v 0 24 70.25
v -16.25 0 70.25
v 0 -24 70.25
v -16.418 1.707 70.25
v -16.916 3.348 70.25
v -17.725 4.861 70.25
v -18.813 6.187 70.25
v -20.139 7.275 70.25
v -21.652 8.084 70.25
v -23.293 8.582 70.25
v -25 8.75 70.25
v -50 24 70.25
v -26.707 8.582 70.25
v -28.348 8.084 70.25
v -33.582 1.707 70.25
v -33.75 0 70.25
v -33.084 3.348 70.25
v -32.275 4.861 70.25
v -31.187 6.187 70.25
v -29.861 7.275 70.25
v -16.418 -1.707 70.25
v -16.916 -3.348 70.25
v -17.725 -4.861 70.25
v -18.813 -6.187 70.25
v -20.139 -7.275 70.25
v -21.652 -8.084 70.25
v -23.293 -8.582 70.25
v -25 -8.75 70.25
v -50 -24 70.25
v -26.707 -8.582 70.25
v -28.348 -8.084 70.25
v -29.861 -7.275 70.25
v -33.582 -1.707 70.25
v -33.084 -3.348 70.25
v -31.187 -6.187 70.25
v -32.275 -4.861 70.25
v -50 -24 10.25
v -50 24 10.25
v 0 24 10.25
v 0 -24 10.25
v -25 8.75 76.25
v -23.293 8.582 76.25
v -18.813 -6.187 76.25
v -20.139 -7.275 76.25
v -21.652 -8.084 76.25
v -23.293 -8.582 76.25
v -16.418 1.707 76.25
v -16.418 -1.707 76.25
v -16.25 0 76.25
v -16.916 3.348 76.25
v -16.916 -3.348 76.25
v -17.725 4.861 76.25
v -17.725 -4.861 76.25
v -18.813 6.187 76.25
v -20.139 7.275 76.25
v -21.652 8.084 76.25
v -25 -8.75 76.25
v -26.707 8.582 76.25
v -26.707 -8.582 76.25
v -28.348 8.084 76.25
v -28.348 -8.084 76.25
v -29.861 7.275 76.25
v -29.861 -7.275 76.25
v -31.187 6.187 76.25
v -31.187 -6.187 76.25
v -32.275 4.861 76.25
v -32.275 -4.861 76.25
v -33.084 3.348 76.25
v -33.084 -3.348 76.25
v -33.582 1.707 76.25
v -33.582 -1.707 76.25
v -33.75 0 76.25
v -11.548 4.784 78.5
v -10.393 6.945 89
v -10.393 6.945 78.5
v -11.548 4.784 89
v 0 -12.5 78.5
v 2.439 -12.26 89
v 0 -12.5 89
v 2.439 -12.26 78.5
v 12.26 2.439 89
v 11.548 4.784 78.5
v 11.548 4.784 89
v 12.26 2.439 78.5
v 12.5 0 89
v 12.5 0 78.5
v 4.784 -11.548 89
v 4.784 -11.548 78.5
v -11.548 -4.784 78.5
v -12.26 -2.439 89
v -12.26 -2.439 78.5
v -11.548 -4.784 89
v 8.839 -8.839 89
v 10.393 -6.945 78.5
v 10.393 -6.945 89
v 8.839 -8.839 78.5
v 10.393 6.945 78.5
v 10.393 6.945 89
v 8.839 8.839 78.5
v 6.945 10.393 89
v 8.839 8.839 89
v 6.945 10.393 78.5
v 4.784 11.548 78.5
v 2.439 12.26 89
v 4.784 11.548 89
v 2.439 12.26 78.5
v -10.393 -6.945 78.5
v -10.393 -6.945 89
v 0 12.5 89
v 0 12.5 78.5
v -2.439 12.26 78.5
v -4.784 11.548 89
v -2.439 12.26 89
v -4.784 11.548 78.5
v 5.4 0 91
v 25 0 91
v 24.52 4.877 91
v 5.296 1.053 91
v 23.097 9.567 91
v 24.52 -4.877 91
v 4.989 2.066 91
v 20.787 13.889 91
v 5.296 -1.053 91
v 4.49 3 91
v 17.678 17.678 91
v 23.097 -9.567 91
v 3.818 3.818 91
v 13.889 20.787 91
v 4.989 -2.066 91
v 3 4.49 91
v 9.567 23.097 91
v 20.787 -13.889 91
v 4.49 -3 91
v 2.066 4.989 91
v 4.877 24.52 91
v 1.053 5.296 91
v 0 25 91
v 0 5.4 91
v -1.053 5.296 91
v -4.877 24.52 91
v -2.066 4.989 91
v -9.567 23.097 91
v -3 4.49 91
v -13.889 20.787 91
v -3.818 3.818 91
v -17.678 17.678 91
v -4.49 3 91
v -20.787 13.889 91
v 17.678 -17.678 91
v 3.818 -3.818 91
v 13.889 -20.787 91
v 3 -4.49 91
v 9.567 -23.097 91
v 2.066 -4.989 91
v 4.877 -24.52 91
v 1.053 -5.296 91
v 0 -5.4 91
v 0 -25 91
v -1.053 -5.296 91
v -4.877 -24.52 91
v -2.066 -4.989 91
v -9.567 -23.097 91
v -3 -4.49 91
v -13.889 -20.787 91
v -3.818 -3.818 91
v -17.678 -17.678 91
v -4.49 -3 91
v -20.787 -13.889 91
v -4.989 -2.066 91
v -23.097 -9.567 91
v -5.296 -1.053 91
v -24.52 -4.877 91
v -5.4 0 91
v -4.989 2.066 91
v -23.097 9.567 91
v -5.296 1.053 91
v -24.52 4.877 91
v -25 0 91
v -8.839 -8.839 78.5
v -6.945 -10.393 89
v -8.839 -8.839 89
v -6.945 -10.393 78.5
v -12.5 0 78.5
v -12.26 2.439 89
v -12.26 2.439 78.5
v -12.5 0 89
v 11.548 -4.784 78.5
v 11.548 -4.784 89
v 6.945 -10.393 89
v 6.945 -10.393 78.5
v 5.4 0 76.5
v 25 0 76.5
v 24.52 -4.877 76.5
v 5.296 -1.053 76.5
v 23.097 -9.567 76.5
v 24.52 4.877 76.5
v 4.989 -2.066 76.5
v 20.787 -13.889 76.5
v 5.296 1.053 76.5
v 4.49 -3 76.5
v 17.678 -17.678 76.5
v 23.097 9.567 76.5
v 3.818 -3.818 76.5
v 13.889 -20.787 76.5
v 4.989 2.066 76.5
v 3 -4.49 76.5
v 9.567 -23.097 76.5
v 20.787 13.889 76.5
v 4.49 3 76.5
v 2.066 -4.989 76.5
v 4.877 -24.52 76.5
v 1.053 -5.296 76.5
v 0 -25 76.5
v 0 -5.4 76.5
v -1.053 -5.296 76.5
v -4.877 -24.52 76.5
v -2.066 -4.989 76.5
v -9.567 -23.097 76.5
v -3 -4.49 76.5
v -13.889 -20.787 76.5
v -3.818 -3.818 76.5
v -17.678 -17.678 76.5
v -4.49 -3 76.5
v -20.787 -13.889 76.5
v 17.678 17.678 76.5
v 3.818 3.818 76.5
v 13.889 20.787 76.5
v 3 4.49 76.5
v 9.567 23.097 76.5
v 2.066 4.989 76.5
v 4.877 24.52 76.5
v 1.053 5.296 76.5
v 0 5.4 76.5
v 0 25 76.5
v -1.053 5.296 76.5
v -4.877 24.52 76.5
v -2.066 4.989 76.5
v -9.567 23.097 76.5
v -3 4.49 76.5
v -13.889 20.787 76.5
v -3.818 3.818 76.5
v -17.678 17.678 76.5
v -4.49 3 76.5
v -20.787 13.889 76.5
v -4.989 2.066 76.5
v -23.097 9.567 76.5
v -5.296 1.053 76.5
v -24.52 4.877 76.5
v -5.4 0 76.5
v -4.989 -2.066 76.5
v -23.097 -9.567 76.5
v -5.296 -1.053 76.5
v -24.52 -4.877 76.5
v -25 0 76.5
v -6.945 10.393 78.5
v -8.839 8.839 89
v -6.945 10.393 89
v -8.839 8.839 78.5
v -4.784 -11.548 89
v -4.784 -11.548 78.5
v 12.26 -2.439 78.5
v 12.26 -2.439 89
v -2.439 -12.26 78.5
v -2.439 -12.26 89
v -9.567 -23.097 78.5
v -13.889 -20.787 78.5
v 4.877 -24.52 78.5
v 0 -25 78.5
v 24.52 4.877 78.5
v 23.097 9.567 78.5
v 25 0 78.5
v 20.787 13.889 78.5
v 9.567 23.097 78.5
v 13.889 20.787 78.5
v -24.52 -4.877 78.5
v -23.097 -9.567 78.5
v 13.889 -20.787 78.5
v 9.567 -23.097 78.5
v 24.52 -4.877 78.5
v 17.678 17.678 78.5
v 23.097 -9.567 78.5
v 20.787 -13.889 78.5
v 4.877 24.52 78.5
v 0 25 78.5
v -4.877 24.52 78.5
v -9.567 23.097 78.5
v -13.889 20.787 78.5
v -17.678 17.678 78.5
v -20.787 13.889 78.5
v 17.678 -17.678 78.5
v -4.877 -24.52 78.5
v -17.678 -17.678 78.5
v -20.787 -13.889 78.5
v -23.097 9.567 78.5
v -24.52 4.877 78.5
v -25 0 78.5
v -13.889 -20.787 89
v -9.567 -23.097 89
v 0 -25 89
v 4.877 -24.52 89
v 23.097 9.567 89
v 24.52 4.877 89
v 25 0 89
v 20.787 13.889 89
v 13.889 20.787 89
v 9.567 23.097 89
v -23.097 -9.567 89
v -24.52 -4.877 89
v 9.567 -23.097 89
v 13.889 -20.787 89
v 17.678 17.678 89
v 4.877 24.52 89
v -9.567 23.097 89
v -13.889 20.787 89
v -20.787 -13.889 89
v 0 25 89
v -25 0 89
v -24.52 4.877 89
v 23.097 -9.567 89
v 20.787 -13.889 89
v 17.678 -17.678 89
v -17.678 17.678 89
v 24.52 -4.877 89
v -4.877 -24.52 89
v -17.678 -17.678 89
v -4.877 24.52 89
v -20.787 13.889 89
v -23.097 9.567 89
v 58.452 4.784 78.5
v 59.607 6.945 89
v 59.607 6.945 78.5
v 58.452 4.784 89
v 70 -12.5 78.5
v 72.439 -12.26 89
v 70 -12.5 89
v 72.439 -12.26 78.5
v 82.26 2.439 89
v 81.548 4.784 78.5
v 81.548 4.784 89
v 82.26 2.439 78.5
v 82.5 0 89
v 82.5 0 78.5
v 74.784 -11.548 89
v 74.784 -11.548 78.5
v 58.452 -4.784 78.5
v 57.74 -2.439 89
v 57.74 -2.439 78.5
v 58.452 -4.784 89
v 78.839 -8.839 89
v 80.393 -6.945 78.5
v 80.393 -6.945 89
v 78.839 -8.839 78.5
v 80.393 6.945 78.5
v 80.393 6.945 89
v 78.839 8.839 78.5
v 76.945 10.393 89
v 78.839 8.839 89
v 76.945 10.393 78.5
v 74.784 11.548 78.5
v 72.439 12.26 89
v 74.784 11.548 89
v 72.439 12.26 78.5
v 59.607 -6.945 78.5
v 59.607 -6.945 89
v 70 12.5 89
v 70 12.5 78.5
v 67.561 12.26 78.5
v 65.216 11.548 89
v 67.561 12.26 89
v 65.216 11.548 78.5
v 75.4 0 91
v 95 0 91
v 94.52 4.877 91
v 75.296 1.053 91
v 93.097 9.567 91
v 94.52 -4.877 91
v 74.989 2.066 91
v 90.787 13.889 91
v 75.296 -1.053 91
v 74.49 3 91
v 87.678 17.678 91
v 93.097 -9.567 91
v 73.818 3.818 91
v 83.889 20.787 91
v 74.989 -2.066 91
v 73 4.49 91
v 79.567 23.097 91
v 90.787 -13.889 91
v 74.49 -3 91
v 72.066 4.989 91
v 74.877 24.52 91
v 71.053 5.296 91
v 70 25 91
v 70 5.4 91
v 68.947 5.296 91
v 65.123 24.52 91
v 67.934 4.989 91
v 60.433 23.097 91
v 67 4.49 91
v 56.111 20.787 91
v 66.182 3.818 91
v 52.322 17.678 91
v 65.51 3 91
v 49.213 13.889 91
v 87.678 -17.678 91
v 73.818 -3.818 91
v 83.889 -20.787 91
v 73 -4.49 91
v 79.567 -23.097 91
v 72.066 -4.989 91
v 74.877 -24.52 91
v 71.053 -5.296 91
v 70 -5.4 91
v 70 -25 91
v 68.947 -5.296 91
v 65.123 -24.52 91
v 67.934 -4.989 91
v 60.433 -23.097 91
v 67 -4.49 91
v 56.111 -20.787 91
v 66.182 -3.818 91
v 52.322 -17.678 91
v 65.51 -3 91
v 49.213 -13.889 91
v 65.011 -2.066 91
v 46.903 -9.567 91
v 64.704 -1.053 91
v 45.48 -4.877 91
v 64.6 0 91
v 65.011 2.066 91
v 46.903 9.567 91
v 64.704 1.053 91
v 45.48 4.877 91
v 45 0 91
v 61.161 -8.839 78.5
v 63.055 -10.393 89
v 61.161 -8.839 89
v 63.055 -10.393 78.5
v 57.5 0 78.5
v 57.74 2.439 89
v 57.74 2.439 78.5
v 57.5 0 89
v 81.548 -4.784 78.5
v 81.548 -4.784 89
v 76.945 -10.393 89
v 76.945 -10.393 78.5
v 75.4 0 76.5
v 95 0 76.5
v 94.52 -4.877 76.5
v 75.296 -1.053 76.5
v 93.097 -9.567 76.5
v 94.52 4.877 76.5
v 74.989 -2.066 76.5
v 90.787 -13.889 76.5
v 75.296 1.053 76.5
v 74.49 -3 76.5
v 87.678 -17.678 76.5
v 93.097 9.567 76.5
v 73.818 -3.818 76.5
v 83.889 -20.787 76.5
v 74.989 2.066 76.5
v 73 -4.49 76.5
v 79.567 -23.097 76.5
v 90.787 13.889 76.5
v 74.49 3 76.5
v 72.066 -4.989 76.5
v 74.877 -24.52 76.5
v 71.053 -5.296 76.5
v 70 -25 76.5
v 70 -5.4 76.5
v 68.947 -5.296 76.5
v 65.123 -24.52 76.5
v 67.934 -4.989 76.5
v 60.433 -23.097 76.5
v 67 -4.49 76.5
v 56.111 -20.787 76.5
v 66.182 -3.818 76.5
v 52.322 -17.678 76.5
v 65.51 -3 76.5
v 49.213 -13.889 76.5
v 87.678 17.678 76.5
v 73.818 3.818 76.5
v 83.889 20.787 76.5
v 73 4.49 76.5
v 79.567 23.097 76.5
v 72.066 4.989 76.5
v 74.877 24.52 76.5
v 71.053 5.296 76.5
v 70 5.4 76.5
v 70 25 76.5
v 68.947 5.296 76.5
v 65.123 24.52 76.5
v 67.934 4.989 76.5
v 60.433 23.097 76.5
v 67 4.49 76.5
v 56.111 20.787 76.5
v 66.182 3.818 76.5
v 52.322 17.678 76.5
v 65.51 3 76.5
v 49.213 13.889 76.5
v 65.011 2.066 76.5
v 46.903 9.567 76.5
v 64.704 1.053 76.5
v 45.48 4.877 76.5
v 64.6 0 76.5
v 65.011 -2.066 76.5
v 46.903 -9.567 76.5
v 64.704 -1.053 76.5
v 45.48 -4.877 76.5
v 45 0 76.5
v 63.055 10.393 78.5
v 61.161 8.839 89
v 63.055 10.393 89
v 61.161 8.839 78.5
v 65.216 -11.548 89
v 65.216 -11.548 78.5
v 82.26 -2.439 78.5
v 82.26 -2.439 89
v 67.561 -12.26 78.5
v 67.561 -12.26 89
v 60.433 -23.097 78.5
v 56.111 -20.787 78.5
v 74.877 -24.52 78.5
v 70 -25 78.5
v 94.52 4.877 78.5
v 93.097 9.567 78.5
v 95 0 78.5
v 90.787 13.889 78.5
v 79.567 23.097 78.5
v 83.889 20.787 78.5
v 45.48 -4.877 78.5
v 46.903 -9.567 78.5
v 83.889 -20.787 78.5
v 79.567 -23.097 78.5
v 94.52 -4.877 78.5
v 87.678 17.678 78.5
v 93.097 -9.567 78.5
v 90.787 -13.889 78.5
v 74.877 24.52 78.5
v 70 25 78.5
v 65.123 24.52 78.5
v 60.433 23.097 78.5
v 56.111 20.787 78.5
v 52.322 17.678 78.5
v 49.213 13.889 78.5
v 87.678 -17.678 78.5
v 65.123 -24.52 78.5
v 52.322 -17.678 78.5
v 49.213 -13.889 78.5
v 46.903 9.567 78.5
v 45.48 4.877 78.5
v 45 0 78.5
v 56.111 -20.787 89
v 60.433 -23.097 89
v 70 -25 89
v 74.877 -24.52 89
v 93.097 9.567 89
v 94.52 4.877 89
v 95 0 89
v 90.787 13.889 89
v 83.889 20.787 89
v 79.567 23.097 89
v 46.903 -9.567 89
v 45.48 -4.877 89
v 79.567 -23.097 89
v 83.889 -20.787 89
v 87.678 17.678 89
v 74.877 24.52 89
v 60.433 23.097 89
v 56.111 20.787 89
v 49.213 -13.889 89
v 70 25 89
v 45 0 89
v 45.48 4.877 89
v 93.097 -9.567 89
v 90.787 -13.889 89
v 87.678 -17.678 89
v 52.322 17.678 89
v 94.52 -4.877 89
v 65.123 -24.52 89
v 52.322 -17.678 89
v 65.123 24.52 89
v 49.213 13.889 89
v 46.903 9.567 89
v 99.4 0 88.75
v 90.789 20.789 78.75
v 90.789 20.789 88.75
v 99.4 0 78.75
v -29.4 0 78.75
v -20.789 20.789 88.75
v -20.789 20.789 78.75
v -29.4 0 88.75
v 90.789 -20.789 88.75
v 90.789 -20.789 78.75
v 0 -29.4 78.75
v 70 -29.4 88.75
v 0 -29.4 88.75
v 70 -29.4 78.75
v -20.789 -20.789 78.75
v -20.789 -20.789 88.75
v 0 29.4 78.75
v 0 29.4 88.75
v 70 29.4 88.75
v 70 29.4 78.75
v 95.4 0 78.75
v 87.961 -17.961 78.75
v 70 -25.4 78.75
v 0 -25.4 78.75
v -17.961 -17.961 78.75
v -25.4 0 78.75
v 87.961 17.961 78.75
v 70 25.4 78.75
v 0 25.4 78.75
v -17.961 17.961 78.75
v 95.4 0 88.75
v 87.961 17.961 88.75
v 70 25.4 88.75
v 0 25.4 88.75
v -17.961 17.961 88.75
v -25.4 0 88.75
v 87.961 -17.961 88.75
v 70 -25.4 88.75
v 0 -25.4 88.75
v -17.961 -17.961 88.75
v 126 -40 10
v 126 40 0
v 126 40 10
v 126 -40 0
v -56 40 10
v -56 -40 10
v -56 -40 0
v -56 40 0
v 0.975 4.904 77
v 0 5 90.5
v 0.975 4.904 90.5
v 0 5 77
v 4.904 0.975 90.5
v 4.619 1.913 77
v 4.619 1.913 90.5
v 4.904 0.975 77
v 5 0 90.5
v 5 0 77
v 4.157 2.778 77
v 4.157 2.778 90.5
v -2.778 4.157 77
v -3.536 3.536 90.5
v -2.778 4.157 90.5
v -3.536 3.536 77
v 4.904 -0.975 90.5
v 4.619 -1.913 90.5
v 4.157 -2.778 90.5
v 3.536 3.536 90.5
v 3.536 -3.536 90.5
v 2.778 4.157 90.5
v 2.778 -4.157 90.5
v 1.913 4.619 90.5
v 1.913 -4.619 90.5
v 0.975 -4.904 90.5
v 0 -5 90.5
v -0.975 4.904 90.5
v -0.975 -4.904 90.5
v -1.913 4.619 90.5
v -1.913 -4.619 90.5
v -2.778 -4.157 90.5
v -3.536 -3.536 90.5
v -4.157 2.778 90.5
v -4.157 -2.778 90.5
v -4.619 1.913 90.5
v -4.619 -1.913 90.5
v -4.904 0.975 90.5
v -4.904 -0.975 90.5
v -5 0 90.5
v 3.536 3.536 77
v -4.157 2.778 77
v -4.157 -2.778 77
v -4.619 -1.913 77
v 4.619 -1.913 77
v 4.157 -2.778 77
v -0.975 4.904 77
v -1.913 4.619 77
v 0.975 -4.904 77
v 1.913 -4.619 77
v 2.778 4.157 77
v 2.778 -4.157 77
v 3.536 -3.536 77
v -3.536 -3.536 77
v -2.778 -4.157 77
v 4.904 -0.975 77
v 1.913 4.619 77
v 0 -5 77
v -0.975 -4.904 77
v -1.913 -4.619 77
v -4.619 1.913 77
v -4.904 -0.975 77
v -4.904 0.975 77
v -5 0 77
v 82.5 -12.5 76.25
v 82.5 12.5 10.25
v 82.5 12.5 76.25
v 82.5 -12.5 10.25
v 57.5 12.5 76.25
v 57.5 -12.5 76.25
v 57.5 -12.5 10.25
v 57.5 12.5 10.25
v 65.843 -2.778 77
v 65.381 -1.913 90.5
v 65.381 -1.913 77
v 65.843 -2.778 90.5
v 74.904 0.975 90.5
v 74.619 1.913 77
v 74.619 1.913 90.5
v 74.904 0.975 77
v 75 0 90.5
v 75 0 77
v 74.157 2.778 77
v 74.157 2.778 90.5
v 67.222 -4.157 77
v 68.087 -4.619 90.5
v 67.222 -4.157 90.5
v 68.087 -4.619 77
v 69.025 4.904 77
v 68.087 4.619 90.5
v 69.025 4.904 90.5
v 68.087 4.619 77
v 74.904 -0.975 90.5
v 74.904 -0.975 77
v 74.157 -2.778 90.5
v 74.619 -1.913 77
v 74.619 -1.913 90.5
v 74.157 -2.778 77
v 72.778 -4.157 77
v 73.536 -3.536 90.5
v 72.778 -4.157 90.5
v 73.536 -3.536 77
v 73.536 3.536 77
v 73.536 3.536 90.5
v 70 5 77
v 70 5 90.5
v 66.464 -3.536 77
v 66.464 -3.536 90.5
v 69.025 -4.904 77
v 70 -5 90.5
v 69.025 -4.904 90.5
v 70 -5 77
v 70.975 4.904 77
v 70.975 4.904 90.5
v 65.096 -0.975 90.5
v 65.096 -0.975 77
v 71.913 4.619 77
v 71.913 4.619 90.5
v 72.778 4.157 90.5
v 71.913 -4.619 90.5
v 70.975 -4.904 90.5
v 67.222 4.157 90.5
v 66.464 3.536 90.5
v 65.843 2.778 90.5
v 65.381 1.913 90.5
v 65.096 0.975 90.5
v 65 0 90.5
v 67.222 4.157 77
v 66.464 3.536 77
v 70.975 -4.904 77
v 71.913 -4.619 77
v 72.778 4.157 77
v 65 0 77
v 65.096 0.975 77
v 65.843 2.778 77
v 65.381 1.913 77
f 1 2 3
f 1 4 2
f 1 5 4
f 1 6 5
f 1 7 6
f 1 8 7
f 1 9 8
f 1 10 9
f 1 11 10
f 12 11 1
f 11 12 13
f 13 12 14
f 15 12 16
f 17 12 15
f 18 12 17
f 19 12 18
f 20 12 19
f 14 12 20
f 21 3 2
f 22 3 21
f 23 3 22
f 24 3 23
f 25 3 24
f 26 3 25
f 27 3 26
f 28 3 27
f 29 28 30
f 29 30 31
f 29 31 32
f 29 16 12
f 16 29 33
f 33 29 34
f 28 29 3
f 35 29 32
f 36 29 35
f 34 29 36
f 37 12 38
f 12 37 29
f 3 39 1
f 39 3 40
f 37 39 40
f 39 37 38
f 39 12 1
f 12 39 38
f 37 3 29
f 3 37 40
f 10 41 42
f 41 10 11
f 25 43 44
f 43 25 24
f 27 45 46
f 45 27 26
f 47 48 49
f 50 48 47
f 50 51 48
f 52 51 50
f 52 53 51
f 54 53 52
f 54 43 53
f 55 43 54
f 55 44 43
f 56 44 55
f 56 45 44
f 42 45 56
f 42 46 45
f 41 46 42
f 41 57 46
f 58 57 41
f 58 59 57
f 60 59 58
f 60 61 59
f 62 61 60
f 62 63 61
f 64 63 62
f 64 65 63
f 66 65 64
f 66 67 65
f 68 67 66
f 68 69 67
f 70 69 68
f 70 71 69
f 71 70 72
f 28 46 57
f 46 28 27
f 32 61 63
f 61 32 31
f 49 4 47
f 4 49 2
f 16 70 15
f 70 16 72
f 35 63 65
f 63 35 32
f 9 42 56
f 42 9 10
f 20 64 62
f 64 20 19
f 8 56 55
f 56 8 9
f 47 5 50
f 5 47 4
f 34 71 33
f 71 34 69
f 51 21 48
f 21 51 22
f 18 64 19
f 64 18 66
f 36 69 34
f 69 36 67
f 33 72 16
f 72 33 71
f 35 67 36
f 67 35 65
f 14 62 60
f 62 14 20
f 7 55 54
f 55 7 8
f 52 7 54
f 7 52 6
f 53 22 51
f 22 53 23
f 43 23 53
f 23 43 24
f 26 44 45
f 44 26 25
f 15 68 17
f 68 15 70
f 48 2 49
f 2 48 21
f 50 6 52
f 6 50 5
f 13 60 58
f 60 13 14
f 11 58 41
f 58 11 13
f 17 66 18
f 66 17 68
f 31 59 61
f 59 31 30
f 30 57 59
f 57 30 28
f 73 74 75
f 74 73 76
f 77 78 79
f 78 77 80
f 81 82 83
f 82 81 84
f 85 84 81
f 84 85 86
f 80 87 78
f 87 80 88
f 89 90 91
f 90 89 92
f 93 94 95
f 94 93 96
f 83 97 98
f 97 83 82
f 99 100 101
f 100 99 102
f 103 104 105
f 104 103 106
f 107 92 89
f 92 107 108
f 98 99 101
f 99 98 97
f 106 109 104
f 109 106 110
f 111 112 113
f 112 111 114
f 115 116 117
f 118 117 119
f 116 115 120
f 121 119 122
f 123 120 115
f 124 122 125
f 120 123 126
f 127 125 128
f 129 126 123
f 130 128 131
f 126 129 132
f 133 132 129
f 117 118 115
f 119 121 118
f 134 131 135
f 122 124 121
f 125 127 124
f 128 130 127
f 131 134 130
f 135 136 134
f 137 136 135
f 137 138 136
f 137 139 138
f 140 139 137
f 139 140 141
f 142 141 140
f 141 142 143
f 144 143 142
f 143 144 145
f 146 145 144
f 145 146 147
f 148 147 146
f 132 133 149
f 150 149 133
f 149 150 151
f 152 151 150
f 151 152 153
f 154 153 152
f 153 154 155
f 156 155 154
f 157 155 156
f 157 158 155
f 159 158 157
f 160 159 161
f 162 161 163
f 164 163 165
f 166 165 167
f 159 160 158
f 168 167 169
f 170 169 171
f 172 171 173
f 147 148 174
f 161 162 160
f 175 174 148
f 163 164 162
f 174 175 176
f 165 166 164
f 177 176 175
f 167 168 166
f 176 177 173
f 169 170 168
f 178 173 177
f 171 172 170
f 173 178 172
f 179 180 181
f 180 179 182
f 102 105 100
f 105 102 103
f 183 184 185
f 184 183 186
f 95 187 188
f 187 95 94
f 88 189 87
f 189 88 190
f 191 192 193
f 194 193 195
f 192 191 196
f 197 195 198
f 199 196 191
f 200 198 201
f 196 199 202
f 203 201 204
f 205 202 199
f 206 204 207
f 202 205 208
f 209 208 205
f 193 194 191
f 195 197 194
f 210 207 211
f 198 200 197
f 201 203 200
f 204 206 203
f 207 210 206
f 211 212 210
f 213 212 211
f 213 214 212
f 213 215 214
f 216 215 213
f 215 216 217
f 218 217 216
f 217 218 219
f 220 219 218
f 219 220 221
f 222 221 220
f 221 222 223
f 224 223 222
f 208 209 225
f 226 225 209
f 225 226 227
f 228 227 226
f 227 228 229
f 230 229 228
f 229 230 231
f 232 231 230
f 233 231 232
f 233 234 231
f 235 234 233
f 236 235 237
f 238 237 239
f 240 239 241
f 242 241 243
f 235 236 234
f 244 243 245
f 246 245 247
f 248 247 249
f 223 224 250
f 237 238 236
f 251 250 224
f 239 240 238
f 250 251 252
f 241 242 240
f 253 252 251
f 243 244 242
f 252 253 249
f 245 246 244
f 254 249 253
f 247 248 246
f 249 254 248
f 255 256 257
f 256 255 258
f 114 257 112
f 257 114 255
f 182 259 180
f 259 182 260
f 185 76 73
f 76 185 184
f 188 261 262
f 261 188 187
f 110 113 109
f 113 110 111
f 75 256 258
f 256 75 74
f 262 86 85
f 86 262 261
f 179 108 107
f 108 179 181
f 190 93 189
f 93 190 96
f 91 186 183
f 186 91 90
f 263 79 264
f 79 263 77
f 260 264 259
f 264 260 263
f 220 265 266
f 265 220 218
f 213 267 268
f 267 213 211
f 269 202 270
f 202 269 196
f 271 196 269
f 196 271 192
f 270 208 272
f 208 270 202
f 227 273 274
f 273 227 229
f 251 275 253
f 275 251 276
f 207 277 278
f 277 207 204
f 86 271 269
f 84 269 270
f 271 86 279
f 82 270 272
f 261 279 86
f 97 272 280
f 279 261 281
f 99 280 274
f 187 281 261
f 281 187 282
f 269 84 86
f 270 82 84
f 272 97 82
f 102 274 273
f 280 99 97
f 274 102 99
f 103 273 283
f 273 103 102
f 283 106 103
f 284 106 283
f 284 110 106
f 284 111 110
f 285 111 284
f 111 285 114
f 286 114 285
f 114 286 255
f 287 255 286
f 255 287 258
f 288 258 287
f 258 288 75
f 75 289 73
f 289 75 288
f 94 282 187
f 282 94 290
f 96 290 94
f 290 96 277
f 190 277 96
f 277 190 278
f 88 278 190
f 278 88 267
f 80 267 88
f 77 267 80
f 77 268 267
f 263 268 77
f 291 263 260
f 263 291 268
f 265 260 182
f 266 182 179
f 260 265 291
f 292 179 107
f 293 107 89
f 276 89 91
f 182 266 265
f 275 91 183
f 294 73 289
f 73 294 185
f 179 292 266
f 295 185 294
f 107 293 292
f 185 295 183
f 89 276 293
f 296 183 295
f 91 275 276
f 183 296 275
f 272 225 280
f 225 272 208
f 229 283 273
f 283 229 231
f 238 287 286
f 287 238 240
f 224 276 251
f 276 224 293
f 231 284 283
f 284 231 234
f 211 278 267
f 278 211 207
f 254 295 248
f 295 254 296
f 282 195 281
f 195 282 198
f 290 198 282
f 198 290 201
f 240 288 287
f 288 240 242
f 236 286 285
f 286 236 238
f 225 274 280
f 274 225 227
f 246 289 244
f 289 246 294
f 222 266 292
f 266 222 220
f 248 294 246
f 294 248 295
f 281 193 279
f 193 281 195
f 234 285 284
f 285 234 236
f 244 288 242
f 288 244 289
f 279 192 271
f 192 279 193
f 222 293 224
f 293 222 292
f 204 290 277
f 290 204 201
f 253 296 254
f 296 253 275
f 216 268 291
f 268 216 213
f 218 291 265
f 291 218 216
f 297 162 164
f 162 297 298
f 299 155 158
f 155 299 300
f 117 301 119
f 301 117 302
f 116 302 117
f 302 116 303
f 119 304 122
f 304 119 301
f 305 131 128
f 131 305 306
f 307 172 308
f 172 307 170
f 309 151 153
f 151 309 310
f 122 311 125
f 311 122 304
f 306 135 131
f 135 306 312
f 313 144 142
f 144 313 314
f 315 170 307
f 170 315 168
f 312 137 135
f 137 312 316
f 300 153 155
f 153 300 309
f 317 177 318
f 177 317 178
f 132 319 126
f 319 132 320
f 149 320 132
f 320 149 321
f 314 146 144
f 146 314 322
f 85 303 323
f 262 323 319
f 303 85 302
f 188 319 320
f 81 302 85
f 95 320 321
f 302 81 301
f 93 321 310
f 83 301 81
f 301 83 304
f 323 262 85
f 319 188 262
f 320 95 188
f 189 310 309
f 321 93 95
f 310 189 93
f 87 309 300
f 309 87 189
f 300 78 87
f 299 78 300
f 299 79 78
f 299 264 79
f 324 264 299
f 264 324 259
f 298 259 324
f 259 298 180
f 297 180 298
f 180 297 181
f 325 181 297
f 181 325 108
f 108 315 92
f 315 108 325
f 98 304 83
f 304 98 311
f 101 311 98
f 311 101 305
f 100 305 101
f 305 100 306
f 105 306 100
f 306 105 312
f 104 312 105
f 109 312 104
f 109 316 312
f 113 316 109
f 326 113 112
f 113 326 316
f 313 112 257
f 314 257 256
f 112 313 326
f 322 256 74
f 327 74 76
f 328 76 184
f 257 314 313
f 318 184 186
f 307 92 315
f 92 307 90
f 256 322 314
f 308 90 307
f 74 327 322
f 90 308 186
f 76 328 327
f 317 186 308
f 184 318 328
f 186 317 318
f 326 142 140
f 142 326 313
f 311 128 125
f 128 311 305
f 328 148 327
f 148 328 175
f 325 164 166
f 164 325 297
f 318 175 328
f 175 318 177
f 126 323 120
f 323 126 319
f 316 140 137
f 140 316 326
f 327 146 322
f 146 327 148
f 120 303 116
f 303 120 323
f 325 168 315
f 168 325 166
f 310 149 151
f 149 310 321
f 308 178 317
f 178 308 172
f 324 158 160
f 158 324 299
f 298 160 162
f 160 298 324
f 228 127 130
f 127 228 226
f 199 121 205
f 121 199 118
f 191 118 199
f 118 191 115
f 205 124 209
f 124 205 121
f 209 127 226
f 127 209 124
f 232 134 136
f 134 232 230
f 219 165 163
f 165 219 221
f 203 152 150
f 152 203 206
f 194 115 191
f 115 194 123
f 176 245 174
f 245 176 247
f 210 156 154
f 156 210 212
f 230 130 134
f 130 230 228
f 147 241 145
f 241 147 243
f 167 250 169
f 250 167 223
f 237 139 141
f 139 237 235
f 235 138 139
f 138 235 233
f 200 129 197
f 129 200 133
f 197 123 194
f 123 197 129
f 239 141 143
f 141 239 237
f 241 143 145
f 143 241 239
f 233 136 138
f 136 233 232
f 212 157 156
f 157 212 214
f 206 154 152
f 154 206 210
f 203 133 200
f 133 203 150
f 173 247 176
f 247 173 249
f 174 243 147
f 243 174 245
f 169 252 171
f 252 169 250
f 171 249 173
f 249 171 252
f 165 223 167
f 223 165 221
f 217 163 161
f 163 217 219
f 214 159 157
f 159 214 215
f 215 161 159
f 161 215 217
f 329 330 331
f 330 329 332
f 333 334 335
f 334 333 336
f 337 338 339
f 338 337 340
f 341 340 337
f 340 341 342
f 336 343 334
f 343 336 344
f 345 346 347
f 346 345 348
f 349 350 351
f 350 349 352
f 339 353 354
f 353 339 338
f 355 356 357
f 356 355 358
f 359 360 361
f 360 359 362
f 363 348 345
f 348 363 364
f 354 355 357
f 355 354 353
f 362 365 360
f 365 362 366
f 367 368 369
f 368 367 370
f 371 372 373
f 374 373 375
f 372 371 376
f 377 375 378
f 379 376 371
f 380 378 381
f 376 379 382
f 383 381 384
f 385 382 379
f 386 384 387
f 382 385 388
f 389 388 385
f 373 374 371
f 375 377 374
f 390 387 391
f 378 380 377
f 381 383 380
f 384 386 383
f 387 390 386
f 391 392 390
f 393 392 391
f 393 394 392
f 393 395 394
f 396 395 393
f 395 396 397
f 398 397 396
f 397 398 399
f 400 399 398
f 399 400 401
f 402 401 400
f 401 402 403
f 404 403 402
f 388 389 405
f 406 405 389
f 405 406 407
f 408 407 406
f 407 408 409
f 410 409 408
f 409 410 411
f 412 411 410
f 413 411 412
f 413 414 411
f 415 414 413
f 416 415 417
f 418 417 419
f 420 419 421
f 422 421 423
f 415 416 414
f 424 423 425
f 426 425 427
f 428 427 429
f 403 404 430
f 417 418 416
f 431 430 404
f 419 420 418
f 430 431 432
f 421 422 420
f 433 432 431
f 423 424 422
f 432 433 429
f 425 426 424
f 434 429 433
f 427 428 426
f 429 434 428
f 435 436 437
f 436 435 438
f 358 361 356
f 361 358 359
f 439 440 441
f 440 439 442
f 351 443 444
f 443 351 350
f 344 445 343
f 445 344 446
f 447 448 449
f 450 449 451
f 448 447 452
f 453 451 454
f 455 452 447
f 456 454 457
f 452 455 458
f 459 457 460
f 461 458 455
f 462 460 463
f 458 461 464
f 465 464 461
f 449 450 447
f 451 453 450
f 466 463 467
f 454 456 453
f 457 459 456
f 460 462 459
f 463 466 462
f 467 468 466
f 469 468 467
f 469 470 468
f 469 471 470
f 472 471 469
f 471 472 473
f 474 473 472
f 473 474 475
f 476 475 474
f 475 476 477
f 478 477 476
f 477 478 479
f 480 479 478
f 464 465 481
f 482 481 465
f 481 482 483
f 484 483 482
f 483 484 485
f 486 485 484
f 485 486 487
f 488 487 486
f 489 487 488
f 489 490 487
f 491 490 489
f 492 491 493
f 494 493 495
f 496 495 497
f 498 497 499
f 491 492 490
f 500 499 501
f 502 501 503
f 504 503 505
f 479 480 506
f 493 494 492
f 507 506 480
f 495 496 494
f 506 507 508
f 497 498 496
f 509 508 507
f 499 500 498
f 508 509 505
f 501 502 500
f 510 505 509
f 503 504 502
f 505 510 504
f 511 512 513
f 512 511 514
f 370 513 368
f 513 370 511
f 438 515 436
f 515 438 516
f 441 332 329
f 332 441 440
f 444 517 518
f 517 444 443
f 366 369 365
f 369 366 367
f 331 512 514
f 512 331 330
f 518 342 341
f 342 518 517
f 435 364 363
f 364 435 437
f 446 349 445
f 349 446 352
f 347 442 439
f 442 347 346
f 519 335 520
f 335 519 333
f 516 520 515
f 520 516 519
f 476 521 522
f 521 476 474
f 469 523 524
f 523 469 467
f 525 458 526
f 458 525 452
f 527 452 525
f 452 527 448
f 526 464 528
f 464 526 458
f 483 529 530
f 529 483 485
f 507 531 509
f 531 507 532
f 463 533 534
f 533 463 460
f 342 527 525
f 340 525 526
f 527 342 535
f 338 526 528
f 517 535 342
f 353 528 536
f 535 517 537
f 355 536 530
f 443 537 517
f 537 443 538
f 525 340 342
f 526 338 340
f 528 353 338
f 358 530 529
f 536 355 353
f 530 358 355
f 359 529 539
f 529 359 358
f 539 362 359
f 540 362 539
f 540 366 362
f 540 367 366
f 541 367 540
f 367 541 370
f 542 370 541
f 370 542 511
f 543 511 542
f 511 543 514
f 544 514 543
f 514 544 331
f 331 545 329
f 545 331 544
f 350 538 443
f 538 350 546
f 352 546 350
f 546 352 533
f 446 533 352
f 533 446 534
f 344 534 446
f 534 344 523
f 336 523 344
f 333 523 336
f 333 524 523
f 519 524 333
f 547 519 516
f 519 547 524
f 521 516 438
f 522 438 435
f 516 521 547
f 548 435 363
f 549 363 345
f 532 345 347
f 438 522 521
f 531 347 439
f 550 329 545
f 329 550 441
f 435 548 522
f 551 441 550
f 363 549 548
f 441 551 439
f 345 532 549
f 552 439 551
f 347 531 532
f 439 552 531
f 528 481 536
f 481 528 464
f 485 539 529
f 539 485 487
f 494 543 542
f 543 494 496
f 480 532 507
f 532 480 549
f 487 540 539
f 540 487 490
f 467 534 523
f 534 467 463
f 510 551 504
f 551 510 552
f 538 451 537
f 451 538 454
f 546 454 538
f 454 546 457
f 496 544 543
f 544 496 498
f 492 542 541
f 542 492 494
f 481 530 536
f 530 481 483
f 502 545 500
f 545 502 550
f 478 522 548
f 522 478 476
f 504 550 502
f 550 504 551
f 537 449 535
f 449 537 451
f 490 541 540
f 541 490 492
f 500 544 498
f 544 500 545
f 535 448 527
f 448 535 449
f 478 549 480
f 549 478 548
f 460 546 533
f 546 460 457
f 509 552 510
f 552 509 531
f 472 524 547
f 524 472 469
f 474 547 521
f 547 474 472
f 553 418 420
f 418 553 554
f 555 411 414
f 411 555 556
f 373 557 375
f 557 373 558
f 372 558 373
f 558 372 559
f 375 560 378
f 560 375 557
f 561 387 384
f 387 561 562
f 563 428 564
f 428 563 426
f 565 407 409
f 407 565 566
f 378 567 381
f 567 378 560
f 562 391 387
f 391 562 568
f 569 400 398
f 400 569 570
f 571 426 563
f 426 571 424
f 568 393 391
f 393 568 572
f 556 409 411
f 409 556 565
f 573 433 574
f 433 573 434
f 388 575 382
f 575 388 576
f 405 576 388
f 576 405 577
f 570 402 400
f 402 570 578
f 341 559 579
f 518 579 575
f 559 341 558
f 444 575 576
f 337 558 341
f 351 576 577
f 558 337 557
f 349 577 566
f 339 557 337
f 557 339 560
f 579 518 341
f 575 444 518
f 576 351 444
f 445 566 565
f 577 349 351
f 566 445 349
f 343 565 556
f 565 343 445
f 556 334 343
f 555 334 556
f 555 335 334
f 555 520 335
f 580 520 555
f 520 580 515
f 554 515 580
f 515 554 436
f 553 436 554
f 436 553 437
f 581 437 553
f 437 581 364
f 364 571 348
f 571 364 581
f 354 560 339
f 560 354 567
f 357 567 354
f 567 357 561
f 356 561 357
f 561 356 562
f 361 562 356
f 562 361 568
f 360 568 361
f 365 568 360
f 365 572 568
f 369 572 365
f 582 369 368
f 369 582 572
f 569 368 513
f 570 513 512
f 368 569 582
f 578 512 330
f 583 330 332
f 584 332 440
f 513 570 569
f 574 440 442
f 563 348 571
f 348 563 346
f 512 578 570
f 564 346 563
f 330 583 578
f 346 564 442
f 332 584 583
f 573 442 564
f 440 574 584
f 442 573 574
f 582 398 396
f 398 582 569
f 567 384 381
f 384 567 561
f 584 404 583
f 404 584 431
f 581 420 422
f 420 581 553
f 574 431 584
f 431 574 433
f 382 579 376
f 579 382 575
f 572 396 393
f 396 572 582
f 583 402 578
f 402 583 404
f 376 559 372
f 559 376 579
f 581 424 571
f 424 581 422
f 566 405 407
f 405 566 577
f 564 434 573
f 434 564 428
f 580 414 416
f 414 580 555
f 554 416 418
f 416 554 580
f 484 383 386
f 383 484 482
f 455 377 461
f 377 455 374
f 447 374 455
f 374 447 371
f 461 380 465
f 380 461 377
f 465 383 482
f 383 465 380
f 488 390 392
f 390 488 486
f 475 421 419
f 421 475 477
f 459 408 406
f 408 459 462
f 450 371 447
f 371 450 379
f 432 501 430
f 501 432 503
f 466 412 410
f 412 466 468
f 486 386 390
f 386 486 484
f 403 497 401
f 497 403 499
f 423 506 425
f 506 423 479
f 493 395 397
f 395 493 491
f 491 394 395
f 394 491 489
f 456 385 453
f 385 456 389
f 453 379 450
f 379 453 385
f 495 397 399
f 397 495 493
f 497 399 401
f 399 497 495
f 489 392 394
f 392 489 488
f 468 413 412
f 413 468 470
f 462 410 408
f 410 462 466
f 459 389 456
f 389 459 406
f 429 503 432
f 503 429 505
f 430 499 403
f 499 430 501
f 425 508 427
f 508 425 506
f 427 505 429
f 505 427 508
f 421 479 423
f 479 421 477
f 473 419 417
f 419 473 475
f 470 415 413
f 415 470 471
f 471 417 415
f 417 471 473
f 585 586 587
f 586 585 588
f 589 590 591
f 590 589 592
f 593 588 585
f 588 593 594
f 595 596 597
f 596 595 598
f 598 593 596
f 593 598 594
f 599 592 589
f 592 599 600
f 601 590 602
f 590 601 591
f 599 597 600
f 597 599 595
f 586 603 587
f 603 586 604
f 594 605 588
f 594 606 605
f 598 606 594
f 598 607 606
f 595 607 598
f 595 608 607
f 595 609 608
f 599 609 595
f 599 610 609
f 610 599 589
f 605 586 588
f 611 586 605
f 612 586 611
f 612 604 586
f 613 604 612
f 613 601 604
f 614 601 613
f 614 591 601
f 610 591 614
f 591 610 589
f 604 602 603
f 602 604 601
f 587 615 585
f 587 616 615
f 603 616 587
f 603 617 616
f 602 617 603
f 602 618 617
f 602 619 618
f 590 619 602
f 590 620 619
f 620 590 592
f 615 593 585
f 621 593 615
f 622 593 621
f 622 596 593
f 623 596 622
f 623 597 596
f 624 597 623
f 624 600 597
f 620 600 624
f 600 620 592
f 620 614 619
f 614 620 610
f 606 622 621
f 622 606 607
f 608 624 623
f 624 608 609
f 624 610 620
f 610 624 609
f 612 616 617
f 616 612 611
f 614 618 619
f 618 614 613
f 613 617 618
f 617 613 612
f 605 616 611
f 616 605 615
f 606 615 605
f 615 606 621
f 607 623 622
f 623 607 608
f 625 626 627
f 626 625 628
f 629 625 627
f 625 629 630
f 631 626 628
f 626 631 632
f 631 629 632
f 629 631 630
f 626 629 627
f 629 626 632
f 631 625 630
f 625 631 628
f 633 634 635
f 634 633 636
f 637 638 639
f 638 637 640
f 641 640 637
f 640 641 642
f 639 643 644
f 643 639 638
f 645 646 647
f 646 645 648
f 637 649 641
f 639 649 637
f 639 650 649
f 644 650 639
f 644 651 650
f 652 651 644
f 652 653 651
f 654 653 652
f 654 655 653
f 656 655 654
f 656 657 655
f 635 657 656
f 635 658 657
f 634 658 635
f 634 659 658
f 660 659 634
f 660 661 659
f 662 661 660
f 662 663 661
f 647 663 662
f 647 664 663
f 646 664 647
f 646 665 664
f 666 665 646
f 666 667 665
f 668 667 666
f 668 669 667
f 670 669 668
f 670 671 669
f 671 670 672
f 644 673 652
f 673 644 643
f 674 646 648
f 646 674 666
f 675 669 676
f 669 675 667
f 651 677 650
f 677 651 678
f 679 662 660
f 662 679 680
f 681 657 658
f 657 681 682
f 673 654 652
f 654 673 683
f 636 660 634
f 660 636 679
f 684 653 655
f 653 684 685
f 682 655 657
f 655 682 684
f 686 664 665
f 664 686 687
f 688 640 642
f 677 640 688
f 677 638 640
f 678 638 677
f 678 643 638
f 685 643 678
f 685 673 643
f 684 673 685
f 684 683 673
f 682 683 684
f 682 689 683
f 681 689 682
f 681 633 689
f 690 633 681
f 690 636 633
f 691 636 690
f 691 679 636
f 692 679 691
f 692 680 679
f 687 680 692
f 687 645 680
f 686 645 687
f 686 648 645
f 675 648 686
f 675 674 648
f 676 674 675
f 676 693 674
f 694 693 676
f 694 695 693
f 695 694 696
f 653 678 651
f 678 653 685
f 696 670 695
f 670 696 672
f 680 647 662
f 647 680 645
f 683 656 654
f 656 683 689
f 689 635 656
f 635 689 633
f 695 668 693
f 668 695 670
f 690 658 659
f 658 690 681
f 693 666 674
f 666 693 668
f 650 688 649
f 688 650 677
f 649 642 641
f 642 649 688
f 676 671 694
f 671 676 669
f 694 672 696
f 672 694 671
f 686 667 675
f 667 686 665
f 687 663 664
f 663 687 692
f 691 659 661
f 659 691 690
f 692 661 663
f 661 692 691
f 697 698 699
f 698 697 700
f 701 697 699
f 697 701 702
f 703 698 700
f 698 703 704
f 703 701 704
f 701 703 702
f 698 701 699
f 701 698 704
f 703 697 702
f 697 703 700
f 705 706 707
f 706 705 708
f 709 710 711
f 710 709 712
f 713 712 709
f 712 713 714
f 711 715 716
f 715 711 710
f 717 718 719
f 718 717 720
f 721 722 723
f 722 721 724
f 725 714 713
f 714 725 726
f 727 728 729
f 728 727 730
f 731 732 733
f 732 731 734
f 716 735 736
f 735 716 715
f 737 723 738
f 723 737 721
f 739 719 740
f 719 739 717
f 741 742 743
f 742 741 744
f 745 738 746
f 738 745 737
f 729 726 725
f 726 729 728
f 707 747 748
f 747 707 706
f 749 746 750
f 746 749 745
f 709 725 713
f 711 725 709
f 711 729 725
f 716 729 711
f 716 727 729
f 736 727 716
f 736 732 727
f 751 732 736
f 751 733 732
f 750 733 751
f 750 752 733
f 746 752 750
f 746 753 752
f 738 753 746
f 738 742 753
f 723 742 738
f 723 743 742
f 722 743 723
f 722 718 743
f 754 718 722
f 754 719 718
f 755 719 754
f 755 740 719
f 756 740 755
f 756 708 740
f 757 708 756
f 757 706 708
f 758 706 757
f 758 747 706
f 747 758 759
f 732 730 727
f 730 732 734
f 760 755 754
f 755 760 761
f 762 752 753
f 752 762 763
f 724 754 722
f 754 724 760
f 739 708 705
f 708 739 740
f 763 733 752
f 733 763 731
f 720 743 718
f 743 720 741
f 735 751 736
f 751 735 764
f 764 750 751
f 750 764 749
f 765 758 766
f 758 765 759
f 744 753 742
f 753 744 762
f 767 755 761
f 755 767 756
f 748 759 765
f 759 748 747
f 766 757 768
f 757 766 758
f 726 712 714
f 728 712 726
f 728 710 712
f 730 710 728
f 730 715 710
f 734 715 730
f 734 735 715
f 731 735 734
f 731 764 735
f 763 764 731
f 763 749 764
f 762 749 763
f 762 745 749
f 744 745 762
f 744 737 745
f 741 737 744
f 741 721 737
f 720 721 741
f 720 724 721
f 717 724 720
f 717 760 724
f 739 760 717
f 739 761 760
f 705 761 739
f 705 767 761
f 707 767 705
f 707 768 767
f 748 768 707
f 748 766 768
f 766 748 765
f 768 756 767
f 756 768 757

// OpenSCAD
$fn = 32;

// ------------------------------------------------------------------------
// Motor belt drive: span 70 mm, pulleys d50, belt 10 mm wide
// Every part is its own module, assembly() places every instance.
// ------------------------------------------------------------------------

// --- part 1 ---
module base_plate() {
  difference() {
    translate([-91, -40, 0]) cube([182, 80, 10]);
  }
}

// --- part 2 ---
module motor() {
  union() {
    translate([-30, -24, 0]) cube([60, 48, 50]);
    translate([33, 0, 25]) rotate([0, 90, 0]) cylinder(h = 6, d = 17.5, center = true);
  }
}

// --- part 3 ---
module drive_shaft() {
  translate([0, 0, -6.75]) cylinder(h = 13.5, d = 10);
}

// --- part 4 ---
module pulley_drive() {
  difference() {
    union() {
      cylinder(h = 14.5, d = 25);
      cylinder(h = 2, d = 50);
      translate([0, 0, 12.5]) cylinder(h = 2, d = 50);
    }
    translate([0, 0, -1]) cylinder(h = 16.5, d = 10.8);
  }
}

// --- part 5 ---
module idler_post() {
  translate([-12.5, -12.5, 0]) cube([25, 25, 66]);
}

// --- part 6 ---
module driven_shaft() {
  translate([0, 0, -6.75]) cylinder(h = 13.5, d = 10);
}

// --- part 7 ---
module pulley_driven() {
  difference() {
    union() {
      cylinder(h = 14.5, d = 25);
      cylinder(h = 2, d = 50);
      translate([0, 0, 12.5]) cylinder(h = 2, d = 50);
    }
    translate([0, 0, -1]) cylinder(h = 16.5, d = 10.8);
  }
}

// --- part 8 ---
module drive_belt() {
  difference() {
    linear_extrude(height = 10) polygon(points = concat([for (a = [90 : 45 : 270]) [29.4 * cos(a), 29.4 * sin(a)]], [for (a = [270 : 45 : 450]) [70 + 29.4 * cos(a), 29.4 * sin(a)]]));
    translate([0, 0, -1]) linear_extrude(height = 12) polygon(points = concat([for (a = [90 : 45 : 270]) [25.4 * cos(a), 25.4 * sin(a)]], [for (a = [270 : 45 : 450]) [70 + 25.4 * cos(a), 25.4 * sin(a)]]));
  }
}

// --- assembly ---
module assembly() {
  color([0.80, 0.24, 0.20]) translate([35, 0, 0]) rotate([0, 0, 0]) base_plate();
  color([0.20, 0.45, 0.75]) translate([0, 0, 40.25]) rotate([0, 270, 0]) motor();
  color([0.25, 0.62, 0.32]) translate([0, 0, 83.75]) rotate([0, 0, 0]) drive_shaft();
  color([0.92, 0.70, 0.18]) translate([0, 0, 76.5]) rotate([0, 0, 0]) pulley_drive();
  color([0.58, 0.35, 0.70]) translate([70, 0, 10.25]) rotate([0, 0, 0]) idler_post();
  color([0.16, 0.66, 0.66]) translate([70, 0, 83.75]) rotate([0, 0, 0]) driven_shaft();
  color([0.85, 0.48, 0.18]) translate([70, 0, 76.5]) rotate([0, 0, 0]) pulley_driven();
  color([0.55, 0.60, 0.65]) translate([0, 0, 78.75]) rotate([0, 0, 0]) drive_belt();
}

assembly();
